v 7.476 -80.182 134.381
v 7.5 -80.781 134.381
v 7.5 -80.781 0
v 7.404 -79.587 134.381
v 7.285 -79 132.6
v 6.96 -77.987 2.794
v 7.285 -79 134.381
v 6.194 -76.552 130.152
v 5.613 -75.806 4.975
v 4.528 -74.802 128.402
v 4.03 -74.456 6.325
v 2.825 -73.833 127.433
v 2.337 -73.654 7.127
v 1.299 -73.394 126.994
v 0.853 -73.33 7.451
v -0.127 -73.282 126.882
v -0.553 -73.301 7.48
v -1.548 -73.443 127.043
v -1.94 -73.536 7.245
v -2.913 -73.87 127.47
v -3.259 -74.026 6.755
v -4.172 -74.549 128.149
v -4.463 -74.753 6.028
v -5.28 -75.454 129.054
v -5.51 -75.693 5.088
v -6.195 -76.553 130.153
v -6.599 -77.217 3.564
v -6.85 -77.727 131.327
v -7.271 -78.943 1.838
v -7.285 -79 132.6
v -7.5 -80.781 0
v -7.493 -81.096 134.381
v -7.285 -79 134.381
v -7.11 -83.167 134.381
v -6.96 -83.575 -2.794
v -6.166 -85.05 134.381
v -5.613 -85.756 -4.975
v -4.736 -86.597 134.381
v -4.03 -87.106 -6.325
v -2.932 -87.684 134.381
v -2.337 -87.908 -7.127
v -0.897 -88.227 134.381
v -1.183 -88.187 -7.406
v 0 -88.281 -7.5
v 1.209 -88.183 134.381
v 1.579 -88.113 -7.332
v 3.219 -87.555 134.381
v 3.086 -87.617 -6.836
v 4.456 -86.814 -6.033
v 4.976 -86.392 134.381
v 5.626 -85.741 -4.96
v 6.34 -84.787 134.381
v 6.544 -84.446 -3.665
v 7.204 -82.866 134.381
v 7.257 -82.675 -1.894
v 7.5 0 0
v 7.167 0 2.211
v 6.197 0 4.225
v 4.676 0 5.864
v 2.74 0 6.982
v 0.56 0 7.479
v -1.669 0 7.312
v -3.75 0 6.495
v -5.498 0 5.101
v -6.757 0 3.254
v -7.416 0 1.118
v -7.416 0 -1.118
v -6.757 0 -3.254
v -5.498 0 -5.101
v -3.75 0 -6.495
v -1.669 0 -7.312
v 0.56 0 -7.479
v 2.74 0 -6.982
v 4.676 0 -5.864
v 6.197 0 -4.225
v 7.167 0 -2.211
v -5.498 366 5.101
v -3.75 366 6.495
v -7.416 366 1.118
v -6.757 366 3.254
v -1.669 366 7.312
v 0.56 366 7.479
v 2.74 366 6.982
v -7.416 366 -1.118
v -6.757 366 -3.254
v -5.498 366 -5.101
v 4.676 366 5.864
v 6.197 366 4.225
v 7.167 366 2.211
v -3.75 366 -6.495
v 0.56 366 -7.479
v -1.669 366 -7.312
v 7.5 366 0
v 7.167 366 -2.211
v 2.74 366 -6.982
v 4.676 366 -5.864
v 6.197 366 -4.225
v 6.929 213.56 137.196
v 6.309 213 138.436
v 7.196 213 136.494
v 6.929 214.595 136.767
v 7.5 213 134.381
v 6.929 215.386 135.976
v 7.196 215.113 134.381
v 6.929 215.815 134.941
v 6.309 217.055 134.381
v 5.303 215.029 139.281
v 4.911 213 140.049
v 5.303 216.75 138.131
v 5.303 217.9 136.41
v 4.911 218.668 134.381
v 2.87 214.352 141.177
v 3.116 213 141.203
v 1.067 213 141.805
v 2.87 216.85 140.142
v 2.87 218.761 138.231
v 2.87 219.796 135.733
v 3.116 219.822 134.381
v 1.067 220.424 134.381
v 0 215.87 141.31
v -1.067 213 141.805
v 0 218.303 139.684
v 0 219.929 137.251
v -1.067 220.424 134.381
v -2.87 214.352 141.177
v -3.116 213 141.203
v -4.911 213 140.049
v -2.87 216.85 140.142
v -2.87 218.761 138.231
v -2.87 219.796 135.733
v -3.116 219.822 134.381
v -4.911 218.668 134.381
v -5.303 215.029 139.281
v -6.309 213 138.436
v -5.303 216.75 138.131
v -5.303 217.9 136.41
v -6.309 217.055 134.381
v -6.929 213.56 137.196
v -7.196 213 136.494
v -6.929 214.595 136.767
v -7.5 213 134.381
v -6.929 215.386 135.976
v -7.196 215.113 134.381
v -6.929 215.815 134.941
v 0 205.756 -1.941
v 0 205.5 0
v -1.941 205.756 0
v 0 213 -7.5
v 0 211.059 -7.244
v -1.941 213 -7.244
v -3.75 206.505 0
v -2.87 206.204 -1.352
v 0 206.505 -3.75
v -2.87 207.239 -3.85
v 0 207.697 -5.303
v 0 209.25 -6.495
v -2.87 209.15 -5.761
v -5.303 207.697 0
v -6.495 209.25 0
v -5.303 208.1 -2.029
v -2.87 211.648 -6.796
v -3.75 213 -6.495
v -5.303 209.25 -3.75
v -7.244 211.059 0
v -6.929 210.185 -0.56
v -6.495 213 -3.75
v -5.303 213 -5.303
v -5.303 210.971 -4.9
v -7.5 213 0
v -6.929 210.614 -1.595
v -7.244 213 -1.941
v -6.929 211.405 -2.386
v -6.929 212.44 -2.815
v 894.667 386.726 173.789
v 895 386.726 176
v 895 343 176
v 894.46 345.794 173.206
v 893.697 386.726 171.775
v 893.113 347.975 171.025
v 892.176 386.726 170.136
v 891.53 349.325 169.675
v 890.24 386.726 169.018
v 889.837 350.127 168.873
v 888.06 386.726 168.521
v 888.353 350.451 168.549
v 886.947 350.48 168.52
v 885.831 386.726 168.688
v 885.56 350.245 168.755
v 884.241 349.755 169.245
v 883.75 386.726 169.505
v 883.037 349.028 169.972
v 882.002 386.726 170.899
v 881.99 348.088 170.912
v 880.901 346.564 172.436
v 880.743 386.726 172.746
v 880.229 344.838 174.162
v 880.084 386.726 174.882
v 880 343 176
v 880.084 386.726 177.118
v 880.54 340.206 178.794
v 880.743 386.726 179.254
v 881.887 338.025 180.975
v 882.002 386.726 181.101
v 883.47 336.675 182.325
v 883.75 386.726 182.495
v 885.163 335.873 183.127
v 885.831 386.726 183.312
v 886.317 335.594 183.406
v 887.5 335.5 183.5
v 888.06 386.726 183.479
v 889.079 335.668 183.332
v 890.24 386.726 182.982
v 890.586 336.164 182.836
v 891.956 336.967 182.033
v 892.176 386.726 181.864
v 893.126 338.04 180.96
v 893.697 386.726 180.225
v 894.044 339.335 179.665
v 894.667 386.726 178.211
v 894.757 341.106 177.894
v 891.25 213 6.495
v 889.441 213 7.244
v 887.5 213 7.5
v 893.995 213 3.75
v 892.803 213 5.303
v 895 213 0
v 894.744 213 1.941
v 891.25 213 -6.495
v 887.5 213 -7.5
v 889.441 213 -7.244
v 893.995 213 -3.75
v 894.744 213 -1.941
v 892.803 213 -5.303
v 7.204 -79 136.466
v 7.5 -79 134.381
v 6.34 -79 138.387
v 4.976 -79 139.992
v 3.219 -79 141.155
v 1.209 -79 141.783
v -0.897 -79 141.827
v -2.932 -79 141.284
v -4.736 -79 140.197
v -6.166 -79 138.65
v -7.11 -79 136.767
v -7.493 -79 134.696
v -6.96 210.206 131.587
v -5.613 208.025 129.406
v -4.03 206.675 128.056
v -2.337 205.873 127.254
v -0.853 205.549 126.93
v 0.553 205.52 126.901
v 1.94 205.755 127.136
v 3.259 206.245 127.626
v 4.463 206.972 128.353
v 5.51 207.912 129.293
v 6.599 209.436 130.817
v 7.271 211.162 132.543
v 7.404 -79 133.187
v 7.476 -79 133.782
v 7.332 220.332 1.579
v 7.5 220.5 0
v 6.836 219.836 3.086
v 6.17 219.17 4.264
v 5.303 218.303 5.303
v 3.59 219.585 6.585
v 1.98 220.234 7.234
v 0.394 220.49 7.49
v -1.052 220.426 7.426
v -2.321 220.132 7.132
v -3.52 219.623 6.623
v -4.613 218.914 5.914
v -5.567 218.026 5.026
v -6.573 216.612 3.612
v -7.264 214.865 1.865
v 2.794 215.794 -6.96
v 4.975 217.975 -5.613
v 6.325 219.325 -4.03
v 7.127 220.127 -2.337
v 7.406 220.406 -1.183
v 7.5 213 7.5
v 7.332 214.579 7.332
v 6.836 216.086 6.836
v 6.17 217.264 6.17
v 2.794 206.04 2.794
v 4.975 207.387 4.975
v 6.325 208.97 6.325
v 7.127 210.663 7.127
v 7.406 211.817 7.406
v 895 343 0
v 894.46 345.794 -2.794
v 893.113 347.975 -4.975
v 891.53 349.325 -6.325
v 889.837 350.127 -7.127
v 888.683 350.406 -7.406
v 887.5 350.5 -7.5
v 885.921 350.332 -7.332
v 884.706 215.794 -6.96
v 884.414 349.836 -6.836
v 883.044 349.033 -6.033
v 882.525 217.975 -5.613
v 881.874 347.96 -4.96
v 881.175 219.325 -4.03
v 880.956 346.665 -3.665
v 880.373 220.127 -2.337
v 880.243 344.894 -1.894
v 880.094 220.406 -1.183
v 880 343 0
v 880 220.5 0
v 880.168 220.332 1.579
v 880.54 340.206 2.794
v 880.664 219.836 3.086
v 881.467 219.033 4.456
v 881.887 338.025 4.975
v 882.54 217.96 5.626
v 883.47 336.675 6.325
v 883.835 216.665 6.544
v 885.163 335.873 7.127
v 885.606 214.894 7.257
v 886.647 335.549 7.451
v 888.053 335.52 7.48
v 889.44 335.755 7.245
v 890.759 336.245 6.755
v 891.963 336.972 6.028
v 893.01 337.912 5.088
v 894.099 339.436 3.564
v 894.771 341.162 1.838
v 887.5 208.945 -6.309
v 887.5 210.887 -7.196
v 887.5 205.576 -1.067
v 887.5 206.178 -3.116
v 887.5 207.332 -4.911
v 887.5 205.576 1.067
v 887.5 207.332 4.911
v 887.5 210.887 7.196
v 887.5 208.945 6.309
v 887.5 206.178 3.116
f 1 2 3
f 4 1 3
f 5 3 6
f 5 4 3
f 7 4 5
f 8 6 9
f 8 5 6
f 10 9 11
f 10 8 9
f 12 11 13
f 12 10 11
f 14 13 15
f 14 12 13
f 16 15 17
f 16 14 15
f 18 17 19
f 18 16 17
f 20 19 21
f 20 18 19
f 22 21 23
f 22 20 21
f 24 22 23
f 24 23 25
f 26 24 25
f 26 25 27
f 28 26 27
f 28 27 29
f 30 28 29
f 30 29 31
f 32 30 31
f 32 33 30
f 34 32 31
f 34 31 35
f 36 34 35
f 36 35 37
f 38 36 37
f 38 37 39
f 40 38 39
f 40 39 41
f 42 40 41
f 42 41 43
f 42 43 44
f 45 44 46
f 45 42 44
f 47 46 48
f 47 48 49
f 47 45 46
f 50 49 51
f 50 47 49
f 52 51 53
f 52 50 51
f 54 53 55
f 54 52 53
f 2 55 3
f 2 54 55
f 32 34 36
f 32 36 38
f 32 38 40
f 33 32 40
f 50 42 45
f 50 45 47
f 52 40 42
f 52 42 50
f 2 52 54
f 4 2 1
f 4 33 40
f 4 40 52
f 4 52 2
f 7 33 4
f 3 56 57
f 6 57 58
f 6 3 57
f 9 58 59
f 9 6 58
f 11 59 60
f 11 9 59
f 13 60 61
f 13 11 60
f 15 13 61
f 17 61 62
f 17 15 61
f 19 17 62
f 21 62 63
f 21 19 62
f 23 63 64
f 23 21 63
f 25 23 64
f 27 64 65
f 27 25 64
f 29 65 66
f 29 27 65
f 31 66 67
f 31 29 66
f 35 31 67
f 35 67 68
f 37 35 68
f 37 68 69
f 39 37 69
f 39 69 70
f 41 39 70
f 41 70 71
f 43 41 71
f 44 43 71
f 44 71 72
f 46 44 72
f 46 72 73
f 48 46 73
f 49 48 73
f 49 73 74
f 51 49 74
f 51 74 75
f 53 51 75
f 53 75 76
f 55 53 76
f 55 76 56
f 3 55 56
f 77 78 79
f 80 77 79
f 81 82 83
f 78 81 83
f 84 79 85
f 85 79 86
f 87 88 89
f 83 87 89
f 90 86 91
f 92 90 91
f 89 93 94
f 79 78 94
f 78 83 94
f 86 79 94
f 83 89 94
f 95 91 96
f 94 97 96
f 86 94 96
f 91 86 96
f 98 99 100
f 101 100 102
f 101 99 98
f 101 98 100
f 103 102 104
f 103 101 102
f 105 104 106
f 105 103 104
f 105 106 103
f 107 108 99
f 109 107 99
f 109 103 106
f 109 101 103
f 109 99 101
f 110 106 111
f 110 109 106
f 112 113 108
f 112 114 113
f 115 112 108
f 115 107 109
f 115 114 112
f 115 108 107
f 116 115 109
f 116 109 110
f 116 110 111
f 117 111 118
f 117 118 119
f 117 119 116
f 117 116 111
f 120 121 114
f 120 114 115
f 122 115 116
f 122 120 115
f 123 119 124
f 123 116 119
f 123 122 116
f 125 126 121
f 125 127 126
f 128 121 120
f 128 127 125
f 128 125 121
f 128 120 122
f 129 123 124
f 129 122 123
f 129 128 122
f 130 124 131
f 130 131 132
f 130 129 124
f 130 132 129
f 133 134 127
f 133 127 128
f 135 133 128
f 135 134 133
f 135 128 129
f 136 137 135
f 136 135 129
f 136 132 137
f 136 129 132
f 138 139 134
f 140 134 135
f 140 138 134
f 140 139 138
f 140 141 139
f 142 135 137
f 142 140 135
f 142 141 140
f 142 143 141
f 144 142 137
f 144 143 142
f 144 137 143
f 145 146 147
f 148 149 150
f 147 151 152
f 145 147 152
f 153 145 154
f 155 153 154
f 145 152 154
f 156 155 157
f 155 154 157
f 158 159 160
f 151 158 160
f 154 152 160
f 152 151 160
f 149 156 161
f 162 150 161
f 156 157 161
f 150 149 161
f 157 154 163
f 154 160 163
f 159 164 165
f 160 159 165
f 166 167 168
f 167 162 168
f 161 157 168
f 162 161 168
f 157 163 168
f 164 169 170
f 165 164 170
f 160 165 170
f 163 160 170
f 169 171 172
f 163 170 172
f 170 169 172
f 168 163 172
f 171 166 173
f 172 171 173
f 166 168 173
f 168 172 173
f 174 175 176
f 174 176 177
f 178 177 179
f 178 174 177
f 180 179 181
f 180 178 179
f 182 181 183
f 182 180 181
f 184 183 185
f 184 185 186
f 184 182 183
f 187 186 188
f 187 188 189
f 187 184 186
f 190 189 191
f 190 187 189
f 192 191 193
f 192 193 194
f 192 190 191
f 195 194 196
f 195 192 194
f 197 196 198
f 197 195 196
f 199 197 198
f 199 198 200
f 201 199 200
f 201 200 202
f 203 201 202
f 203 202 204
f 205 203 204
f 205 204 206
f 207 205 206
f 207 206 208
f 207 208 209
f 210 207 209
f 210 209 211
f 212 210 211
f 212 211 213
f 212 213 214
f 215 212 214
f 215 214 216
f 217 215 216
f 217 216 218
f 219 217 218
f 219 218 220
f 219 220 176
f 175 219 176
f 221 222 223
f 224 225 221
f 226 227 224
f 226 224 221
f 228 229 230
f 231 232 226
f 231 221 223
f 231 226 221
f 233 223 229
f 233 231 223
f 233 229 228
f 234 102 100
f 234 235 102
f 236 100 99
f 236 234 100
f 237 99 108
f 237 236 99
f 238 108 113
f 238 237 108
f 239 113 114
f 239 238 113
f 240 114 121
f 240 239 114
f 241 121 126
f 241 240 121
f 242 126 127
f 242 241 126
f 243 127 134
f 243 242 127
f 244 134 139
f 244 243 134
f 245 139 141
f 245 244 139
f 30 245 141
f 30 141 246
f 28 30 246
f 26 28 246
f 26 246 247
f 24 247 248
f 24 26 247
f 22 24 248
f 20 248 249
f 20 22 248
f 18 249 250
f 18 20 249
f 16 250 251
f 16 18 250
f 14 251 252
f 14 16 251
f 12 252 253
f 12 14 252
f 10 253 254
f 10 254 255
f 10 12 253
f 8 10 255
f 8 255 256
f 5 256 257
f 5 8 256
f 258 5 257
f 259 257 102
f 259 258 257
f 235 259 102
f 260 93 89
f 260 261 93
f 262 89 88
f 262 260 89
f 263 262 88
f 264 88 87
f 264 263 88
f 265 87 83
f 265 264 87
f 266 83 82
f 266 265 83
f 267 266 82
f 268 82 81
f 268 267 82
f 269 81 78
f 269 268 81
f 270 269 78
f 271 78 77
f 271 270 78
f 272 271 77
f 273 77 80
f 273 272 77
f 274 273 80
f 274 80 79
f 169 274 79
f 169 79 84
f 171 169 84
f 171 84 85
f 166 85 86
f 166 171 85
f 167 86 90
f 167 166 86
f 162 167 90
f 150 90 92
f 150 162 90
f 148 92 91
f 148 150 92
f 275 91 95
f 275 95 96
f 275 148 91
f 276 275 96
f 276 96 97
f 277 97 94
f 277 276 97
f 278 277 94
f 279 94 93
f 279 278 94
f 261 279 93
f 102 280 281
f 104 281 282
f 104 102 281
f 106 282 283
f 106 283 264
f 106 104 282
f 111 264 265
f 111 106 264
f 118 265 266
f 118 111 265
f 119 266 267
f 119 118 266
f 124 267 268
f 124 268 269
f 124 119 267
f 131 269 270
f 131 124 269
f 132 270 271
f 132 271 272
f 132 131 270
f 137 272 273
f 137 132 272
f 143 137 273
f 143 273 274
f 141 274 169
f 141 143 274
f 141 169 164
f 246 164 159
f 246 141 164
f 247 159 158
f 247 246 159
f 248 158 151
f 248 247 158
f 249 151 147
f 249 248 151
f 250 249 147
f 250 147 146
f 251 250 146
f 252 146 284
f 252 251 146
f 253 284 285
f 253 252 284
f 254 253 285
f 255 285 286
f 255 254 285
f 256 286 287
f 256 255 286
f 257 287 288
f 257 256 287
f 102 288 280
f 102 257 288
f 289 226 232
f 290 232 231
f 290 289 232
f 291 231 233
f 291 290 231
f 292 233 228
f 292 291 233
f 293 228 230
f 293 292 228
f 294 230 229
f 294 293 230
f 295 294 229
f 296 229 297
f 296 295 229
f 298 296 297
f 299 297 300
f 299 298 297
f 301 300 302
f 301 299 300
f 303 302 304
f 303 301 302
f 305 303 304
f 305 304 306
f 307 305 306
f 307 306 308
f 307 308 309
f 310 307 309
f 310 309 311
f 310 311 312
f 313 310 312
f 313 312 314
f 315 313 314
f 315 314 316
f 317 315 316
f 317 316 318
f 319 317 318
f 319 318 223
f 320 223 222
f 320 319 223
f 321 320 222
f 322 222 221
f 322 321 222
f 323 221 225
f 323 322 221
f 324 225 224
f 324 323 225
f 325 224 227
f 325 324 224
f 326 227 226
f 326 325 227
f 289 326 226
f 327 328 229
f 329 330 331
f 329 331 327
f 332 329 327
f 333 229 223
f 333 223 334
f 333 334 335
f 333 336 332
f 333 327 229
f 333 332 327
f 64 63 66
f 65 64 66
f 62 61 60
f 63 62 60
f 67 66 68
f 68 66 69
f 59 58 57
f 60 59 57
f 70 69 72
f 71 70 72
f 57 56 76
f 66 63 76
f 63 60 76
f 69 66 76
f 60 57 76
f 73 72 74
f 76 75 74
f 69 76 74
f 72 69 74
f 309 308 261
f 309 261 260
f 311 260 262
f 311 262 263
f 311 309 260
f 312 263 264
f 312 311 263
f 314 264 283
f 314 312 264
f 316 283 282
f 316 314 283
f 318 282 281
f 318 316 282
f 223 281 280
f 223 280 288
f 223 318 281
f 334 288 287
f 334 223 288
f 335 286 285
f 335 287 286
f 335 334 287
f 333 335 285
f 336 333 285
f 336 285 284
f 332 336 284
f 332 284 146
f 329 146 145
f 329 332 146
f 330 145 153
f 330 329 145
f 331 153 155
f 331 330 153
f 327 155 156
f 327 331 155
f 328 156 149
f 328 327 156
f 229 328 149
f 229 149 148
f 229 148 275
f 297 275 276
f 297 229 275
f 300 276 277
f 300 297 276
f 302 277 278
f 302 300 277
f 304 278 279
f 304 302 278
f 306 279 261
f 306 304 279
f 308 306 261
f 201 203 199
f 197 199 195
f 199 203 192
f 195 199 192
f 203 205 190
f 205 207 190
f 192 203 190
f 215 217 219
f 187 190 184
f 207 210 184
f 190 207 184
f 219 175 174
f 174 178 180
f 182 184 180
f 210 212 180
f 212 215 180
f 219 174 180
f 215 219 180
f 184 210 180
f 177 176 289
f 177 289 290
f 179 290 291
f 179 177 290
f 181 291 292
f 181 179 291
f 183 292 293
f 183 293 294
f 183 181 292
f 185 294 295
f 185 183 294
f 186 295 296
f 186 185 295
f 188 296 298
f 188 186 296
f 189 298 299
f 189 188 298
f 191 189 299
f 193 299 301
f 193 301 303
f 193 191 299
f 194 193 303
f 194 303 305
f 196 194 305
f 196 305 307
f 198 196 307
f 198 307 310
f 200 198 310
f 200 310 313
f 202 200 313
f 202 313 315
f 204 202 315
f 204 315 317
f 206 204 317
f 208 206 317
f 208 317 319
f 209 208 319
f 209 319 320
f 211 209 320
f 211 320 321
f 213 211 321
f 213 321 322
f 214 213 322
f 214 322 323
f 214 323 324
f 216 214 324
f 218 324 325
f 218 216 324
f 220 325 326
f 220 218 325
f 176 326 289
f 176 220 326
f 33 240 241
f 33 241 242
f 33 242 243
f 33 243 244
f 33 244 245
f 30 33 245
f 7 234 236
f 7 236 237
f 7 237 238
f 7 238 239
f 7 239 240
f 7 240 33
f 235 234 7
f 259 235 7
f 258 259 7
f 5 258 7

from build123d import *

# Parameters (mm, degrees)
F0_R  = 7.5
F5_R  = 7.5
F7_R  = 7.5
F10_R = 7.5
F15_R = 7.5
F19_R = 7.5


with BuildPart() as f2:
    # F2: sweep along a path in F1
    with BuildLine(Plane.YZ) as f2_path:
        Line((0, 0), (-80.781, 0))
        Line((-80.781, 0), (-80.781, 134.381))
    # F0 (on Front) → F2 (sweep)
    with BuildSketch(Plane.XZ):
        Circle(F0_R)
    sweep(path=f2_path.line, transition=Transition.RIGHT)



with BuildPart() as f6:
    # F6: sweep along a path in F3
    with BuildLine(Plane.XY) as f6_path:
        Line((0, 276.3272254467), (0, 123.3272254467))
    # F5 (on offset) → F6 (sweep)
    with BuildSketch(Plane.XZ.offset(-366)):
        Circle(F5_R)
    sweep(path=f6_path.line)

    # F8: sweep along a path in F1
    with BuildLine(Plane.YZ) as f8_path:
        Line((-80.781, 0), (-80.781, 134.381))
    # F7 (on Top) → F8 (sweep)
    with BuildSketch(Plane.XY):
        with Locations((0, 213)):
            Circle(F7_R)
    sweep(path=f8_path.line)


with BuildPart() as f2_1:
    add(f2.part)

    add(f6.part)  # F12 merges F6
    # F12: sweep along a path in F11
    with BuildLine(Plane.YZ) as f12_path:
        Line((211.219, 134.381), (-80.781, 134.381))
    # F10 (on offset) → F12 (sweep)
    with BuildSketch(Plane.XZ.offset(-213)):
        with Locations((0, 134.381)):
            Circle(F10_R)
    sweep(path=f12_path.line)

    # F8_face (on face) → F13 (revolve)
    with BuildSketch(Plane(origin=(0, 216.1830988618, 134.381), x_dir=(1, 0, 0), z_dir=(0, 0, 1))):
        with BuildLine():
            Line((-7.5, -3.1830988618), (7.5, -3.1830988618))
            ThreePointArc((7.5, -3.1830988618), (0, 4.3169011382), (-7.5, -3.1830988618))
        make_face()
    revolve(axis=Axis((0, 213, 134.381), (-1, 0, 0)))

    # F8_face1 (on face) → F14 (revolve)
    with BuildSketch(Plane(origin=(0, 209.8169011382, 0), x_dir=(1, 0, 0), z_dir=(0, 0, -1))):
        with BuildLine():
            ThreePointArc((7.5, -3.1830988618), (0, 4.3169011382), (-7.5, -3.1830988618))
            Line((-7.5, -3.1830988618), (7.5, -3.1830988618))
        make_face()
    revolve(axis=Axis((0, 213, 0), (1, 0, 0)))

    # F17: sweep along a path in F16
    with BuildLine(Plane.XZ.offset(-213)) as f17_path:
        Line((0, 0), (887.5, 0))
    # F15 (on Right) → F17 (sweep)
    with BuildSketch(Plane.YZ):
        with Locations((213, 0)):
            Circle(F15_R)
    sweep(path=f17_path.line)

    # F20: sweep along a path in F18
    with BuildLine(Plane.YZ) as f20_path:
        Line((213, 0), (343, 0))
        Line((343, 0), (343, 176))
        Line((343, 176), (386.726, 176))
    # F19 (on offset) → F20 (sweep)
    with BuildSketch(Plane.XZ.offset(-213)):
        with Locations((887.5, 0)):
            Circle(F19_R)
    sweep(path=f20_path.line, transition=Transition.RIGHT)


solid = f2_1.part
